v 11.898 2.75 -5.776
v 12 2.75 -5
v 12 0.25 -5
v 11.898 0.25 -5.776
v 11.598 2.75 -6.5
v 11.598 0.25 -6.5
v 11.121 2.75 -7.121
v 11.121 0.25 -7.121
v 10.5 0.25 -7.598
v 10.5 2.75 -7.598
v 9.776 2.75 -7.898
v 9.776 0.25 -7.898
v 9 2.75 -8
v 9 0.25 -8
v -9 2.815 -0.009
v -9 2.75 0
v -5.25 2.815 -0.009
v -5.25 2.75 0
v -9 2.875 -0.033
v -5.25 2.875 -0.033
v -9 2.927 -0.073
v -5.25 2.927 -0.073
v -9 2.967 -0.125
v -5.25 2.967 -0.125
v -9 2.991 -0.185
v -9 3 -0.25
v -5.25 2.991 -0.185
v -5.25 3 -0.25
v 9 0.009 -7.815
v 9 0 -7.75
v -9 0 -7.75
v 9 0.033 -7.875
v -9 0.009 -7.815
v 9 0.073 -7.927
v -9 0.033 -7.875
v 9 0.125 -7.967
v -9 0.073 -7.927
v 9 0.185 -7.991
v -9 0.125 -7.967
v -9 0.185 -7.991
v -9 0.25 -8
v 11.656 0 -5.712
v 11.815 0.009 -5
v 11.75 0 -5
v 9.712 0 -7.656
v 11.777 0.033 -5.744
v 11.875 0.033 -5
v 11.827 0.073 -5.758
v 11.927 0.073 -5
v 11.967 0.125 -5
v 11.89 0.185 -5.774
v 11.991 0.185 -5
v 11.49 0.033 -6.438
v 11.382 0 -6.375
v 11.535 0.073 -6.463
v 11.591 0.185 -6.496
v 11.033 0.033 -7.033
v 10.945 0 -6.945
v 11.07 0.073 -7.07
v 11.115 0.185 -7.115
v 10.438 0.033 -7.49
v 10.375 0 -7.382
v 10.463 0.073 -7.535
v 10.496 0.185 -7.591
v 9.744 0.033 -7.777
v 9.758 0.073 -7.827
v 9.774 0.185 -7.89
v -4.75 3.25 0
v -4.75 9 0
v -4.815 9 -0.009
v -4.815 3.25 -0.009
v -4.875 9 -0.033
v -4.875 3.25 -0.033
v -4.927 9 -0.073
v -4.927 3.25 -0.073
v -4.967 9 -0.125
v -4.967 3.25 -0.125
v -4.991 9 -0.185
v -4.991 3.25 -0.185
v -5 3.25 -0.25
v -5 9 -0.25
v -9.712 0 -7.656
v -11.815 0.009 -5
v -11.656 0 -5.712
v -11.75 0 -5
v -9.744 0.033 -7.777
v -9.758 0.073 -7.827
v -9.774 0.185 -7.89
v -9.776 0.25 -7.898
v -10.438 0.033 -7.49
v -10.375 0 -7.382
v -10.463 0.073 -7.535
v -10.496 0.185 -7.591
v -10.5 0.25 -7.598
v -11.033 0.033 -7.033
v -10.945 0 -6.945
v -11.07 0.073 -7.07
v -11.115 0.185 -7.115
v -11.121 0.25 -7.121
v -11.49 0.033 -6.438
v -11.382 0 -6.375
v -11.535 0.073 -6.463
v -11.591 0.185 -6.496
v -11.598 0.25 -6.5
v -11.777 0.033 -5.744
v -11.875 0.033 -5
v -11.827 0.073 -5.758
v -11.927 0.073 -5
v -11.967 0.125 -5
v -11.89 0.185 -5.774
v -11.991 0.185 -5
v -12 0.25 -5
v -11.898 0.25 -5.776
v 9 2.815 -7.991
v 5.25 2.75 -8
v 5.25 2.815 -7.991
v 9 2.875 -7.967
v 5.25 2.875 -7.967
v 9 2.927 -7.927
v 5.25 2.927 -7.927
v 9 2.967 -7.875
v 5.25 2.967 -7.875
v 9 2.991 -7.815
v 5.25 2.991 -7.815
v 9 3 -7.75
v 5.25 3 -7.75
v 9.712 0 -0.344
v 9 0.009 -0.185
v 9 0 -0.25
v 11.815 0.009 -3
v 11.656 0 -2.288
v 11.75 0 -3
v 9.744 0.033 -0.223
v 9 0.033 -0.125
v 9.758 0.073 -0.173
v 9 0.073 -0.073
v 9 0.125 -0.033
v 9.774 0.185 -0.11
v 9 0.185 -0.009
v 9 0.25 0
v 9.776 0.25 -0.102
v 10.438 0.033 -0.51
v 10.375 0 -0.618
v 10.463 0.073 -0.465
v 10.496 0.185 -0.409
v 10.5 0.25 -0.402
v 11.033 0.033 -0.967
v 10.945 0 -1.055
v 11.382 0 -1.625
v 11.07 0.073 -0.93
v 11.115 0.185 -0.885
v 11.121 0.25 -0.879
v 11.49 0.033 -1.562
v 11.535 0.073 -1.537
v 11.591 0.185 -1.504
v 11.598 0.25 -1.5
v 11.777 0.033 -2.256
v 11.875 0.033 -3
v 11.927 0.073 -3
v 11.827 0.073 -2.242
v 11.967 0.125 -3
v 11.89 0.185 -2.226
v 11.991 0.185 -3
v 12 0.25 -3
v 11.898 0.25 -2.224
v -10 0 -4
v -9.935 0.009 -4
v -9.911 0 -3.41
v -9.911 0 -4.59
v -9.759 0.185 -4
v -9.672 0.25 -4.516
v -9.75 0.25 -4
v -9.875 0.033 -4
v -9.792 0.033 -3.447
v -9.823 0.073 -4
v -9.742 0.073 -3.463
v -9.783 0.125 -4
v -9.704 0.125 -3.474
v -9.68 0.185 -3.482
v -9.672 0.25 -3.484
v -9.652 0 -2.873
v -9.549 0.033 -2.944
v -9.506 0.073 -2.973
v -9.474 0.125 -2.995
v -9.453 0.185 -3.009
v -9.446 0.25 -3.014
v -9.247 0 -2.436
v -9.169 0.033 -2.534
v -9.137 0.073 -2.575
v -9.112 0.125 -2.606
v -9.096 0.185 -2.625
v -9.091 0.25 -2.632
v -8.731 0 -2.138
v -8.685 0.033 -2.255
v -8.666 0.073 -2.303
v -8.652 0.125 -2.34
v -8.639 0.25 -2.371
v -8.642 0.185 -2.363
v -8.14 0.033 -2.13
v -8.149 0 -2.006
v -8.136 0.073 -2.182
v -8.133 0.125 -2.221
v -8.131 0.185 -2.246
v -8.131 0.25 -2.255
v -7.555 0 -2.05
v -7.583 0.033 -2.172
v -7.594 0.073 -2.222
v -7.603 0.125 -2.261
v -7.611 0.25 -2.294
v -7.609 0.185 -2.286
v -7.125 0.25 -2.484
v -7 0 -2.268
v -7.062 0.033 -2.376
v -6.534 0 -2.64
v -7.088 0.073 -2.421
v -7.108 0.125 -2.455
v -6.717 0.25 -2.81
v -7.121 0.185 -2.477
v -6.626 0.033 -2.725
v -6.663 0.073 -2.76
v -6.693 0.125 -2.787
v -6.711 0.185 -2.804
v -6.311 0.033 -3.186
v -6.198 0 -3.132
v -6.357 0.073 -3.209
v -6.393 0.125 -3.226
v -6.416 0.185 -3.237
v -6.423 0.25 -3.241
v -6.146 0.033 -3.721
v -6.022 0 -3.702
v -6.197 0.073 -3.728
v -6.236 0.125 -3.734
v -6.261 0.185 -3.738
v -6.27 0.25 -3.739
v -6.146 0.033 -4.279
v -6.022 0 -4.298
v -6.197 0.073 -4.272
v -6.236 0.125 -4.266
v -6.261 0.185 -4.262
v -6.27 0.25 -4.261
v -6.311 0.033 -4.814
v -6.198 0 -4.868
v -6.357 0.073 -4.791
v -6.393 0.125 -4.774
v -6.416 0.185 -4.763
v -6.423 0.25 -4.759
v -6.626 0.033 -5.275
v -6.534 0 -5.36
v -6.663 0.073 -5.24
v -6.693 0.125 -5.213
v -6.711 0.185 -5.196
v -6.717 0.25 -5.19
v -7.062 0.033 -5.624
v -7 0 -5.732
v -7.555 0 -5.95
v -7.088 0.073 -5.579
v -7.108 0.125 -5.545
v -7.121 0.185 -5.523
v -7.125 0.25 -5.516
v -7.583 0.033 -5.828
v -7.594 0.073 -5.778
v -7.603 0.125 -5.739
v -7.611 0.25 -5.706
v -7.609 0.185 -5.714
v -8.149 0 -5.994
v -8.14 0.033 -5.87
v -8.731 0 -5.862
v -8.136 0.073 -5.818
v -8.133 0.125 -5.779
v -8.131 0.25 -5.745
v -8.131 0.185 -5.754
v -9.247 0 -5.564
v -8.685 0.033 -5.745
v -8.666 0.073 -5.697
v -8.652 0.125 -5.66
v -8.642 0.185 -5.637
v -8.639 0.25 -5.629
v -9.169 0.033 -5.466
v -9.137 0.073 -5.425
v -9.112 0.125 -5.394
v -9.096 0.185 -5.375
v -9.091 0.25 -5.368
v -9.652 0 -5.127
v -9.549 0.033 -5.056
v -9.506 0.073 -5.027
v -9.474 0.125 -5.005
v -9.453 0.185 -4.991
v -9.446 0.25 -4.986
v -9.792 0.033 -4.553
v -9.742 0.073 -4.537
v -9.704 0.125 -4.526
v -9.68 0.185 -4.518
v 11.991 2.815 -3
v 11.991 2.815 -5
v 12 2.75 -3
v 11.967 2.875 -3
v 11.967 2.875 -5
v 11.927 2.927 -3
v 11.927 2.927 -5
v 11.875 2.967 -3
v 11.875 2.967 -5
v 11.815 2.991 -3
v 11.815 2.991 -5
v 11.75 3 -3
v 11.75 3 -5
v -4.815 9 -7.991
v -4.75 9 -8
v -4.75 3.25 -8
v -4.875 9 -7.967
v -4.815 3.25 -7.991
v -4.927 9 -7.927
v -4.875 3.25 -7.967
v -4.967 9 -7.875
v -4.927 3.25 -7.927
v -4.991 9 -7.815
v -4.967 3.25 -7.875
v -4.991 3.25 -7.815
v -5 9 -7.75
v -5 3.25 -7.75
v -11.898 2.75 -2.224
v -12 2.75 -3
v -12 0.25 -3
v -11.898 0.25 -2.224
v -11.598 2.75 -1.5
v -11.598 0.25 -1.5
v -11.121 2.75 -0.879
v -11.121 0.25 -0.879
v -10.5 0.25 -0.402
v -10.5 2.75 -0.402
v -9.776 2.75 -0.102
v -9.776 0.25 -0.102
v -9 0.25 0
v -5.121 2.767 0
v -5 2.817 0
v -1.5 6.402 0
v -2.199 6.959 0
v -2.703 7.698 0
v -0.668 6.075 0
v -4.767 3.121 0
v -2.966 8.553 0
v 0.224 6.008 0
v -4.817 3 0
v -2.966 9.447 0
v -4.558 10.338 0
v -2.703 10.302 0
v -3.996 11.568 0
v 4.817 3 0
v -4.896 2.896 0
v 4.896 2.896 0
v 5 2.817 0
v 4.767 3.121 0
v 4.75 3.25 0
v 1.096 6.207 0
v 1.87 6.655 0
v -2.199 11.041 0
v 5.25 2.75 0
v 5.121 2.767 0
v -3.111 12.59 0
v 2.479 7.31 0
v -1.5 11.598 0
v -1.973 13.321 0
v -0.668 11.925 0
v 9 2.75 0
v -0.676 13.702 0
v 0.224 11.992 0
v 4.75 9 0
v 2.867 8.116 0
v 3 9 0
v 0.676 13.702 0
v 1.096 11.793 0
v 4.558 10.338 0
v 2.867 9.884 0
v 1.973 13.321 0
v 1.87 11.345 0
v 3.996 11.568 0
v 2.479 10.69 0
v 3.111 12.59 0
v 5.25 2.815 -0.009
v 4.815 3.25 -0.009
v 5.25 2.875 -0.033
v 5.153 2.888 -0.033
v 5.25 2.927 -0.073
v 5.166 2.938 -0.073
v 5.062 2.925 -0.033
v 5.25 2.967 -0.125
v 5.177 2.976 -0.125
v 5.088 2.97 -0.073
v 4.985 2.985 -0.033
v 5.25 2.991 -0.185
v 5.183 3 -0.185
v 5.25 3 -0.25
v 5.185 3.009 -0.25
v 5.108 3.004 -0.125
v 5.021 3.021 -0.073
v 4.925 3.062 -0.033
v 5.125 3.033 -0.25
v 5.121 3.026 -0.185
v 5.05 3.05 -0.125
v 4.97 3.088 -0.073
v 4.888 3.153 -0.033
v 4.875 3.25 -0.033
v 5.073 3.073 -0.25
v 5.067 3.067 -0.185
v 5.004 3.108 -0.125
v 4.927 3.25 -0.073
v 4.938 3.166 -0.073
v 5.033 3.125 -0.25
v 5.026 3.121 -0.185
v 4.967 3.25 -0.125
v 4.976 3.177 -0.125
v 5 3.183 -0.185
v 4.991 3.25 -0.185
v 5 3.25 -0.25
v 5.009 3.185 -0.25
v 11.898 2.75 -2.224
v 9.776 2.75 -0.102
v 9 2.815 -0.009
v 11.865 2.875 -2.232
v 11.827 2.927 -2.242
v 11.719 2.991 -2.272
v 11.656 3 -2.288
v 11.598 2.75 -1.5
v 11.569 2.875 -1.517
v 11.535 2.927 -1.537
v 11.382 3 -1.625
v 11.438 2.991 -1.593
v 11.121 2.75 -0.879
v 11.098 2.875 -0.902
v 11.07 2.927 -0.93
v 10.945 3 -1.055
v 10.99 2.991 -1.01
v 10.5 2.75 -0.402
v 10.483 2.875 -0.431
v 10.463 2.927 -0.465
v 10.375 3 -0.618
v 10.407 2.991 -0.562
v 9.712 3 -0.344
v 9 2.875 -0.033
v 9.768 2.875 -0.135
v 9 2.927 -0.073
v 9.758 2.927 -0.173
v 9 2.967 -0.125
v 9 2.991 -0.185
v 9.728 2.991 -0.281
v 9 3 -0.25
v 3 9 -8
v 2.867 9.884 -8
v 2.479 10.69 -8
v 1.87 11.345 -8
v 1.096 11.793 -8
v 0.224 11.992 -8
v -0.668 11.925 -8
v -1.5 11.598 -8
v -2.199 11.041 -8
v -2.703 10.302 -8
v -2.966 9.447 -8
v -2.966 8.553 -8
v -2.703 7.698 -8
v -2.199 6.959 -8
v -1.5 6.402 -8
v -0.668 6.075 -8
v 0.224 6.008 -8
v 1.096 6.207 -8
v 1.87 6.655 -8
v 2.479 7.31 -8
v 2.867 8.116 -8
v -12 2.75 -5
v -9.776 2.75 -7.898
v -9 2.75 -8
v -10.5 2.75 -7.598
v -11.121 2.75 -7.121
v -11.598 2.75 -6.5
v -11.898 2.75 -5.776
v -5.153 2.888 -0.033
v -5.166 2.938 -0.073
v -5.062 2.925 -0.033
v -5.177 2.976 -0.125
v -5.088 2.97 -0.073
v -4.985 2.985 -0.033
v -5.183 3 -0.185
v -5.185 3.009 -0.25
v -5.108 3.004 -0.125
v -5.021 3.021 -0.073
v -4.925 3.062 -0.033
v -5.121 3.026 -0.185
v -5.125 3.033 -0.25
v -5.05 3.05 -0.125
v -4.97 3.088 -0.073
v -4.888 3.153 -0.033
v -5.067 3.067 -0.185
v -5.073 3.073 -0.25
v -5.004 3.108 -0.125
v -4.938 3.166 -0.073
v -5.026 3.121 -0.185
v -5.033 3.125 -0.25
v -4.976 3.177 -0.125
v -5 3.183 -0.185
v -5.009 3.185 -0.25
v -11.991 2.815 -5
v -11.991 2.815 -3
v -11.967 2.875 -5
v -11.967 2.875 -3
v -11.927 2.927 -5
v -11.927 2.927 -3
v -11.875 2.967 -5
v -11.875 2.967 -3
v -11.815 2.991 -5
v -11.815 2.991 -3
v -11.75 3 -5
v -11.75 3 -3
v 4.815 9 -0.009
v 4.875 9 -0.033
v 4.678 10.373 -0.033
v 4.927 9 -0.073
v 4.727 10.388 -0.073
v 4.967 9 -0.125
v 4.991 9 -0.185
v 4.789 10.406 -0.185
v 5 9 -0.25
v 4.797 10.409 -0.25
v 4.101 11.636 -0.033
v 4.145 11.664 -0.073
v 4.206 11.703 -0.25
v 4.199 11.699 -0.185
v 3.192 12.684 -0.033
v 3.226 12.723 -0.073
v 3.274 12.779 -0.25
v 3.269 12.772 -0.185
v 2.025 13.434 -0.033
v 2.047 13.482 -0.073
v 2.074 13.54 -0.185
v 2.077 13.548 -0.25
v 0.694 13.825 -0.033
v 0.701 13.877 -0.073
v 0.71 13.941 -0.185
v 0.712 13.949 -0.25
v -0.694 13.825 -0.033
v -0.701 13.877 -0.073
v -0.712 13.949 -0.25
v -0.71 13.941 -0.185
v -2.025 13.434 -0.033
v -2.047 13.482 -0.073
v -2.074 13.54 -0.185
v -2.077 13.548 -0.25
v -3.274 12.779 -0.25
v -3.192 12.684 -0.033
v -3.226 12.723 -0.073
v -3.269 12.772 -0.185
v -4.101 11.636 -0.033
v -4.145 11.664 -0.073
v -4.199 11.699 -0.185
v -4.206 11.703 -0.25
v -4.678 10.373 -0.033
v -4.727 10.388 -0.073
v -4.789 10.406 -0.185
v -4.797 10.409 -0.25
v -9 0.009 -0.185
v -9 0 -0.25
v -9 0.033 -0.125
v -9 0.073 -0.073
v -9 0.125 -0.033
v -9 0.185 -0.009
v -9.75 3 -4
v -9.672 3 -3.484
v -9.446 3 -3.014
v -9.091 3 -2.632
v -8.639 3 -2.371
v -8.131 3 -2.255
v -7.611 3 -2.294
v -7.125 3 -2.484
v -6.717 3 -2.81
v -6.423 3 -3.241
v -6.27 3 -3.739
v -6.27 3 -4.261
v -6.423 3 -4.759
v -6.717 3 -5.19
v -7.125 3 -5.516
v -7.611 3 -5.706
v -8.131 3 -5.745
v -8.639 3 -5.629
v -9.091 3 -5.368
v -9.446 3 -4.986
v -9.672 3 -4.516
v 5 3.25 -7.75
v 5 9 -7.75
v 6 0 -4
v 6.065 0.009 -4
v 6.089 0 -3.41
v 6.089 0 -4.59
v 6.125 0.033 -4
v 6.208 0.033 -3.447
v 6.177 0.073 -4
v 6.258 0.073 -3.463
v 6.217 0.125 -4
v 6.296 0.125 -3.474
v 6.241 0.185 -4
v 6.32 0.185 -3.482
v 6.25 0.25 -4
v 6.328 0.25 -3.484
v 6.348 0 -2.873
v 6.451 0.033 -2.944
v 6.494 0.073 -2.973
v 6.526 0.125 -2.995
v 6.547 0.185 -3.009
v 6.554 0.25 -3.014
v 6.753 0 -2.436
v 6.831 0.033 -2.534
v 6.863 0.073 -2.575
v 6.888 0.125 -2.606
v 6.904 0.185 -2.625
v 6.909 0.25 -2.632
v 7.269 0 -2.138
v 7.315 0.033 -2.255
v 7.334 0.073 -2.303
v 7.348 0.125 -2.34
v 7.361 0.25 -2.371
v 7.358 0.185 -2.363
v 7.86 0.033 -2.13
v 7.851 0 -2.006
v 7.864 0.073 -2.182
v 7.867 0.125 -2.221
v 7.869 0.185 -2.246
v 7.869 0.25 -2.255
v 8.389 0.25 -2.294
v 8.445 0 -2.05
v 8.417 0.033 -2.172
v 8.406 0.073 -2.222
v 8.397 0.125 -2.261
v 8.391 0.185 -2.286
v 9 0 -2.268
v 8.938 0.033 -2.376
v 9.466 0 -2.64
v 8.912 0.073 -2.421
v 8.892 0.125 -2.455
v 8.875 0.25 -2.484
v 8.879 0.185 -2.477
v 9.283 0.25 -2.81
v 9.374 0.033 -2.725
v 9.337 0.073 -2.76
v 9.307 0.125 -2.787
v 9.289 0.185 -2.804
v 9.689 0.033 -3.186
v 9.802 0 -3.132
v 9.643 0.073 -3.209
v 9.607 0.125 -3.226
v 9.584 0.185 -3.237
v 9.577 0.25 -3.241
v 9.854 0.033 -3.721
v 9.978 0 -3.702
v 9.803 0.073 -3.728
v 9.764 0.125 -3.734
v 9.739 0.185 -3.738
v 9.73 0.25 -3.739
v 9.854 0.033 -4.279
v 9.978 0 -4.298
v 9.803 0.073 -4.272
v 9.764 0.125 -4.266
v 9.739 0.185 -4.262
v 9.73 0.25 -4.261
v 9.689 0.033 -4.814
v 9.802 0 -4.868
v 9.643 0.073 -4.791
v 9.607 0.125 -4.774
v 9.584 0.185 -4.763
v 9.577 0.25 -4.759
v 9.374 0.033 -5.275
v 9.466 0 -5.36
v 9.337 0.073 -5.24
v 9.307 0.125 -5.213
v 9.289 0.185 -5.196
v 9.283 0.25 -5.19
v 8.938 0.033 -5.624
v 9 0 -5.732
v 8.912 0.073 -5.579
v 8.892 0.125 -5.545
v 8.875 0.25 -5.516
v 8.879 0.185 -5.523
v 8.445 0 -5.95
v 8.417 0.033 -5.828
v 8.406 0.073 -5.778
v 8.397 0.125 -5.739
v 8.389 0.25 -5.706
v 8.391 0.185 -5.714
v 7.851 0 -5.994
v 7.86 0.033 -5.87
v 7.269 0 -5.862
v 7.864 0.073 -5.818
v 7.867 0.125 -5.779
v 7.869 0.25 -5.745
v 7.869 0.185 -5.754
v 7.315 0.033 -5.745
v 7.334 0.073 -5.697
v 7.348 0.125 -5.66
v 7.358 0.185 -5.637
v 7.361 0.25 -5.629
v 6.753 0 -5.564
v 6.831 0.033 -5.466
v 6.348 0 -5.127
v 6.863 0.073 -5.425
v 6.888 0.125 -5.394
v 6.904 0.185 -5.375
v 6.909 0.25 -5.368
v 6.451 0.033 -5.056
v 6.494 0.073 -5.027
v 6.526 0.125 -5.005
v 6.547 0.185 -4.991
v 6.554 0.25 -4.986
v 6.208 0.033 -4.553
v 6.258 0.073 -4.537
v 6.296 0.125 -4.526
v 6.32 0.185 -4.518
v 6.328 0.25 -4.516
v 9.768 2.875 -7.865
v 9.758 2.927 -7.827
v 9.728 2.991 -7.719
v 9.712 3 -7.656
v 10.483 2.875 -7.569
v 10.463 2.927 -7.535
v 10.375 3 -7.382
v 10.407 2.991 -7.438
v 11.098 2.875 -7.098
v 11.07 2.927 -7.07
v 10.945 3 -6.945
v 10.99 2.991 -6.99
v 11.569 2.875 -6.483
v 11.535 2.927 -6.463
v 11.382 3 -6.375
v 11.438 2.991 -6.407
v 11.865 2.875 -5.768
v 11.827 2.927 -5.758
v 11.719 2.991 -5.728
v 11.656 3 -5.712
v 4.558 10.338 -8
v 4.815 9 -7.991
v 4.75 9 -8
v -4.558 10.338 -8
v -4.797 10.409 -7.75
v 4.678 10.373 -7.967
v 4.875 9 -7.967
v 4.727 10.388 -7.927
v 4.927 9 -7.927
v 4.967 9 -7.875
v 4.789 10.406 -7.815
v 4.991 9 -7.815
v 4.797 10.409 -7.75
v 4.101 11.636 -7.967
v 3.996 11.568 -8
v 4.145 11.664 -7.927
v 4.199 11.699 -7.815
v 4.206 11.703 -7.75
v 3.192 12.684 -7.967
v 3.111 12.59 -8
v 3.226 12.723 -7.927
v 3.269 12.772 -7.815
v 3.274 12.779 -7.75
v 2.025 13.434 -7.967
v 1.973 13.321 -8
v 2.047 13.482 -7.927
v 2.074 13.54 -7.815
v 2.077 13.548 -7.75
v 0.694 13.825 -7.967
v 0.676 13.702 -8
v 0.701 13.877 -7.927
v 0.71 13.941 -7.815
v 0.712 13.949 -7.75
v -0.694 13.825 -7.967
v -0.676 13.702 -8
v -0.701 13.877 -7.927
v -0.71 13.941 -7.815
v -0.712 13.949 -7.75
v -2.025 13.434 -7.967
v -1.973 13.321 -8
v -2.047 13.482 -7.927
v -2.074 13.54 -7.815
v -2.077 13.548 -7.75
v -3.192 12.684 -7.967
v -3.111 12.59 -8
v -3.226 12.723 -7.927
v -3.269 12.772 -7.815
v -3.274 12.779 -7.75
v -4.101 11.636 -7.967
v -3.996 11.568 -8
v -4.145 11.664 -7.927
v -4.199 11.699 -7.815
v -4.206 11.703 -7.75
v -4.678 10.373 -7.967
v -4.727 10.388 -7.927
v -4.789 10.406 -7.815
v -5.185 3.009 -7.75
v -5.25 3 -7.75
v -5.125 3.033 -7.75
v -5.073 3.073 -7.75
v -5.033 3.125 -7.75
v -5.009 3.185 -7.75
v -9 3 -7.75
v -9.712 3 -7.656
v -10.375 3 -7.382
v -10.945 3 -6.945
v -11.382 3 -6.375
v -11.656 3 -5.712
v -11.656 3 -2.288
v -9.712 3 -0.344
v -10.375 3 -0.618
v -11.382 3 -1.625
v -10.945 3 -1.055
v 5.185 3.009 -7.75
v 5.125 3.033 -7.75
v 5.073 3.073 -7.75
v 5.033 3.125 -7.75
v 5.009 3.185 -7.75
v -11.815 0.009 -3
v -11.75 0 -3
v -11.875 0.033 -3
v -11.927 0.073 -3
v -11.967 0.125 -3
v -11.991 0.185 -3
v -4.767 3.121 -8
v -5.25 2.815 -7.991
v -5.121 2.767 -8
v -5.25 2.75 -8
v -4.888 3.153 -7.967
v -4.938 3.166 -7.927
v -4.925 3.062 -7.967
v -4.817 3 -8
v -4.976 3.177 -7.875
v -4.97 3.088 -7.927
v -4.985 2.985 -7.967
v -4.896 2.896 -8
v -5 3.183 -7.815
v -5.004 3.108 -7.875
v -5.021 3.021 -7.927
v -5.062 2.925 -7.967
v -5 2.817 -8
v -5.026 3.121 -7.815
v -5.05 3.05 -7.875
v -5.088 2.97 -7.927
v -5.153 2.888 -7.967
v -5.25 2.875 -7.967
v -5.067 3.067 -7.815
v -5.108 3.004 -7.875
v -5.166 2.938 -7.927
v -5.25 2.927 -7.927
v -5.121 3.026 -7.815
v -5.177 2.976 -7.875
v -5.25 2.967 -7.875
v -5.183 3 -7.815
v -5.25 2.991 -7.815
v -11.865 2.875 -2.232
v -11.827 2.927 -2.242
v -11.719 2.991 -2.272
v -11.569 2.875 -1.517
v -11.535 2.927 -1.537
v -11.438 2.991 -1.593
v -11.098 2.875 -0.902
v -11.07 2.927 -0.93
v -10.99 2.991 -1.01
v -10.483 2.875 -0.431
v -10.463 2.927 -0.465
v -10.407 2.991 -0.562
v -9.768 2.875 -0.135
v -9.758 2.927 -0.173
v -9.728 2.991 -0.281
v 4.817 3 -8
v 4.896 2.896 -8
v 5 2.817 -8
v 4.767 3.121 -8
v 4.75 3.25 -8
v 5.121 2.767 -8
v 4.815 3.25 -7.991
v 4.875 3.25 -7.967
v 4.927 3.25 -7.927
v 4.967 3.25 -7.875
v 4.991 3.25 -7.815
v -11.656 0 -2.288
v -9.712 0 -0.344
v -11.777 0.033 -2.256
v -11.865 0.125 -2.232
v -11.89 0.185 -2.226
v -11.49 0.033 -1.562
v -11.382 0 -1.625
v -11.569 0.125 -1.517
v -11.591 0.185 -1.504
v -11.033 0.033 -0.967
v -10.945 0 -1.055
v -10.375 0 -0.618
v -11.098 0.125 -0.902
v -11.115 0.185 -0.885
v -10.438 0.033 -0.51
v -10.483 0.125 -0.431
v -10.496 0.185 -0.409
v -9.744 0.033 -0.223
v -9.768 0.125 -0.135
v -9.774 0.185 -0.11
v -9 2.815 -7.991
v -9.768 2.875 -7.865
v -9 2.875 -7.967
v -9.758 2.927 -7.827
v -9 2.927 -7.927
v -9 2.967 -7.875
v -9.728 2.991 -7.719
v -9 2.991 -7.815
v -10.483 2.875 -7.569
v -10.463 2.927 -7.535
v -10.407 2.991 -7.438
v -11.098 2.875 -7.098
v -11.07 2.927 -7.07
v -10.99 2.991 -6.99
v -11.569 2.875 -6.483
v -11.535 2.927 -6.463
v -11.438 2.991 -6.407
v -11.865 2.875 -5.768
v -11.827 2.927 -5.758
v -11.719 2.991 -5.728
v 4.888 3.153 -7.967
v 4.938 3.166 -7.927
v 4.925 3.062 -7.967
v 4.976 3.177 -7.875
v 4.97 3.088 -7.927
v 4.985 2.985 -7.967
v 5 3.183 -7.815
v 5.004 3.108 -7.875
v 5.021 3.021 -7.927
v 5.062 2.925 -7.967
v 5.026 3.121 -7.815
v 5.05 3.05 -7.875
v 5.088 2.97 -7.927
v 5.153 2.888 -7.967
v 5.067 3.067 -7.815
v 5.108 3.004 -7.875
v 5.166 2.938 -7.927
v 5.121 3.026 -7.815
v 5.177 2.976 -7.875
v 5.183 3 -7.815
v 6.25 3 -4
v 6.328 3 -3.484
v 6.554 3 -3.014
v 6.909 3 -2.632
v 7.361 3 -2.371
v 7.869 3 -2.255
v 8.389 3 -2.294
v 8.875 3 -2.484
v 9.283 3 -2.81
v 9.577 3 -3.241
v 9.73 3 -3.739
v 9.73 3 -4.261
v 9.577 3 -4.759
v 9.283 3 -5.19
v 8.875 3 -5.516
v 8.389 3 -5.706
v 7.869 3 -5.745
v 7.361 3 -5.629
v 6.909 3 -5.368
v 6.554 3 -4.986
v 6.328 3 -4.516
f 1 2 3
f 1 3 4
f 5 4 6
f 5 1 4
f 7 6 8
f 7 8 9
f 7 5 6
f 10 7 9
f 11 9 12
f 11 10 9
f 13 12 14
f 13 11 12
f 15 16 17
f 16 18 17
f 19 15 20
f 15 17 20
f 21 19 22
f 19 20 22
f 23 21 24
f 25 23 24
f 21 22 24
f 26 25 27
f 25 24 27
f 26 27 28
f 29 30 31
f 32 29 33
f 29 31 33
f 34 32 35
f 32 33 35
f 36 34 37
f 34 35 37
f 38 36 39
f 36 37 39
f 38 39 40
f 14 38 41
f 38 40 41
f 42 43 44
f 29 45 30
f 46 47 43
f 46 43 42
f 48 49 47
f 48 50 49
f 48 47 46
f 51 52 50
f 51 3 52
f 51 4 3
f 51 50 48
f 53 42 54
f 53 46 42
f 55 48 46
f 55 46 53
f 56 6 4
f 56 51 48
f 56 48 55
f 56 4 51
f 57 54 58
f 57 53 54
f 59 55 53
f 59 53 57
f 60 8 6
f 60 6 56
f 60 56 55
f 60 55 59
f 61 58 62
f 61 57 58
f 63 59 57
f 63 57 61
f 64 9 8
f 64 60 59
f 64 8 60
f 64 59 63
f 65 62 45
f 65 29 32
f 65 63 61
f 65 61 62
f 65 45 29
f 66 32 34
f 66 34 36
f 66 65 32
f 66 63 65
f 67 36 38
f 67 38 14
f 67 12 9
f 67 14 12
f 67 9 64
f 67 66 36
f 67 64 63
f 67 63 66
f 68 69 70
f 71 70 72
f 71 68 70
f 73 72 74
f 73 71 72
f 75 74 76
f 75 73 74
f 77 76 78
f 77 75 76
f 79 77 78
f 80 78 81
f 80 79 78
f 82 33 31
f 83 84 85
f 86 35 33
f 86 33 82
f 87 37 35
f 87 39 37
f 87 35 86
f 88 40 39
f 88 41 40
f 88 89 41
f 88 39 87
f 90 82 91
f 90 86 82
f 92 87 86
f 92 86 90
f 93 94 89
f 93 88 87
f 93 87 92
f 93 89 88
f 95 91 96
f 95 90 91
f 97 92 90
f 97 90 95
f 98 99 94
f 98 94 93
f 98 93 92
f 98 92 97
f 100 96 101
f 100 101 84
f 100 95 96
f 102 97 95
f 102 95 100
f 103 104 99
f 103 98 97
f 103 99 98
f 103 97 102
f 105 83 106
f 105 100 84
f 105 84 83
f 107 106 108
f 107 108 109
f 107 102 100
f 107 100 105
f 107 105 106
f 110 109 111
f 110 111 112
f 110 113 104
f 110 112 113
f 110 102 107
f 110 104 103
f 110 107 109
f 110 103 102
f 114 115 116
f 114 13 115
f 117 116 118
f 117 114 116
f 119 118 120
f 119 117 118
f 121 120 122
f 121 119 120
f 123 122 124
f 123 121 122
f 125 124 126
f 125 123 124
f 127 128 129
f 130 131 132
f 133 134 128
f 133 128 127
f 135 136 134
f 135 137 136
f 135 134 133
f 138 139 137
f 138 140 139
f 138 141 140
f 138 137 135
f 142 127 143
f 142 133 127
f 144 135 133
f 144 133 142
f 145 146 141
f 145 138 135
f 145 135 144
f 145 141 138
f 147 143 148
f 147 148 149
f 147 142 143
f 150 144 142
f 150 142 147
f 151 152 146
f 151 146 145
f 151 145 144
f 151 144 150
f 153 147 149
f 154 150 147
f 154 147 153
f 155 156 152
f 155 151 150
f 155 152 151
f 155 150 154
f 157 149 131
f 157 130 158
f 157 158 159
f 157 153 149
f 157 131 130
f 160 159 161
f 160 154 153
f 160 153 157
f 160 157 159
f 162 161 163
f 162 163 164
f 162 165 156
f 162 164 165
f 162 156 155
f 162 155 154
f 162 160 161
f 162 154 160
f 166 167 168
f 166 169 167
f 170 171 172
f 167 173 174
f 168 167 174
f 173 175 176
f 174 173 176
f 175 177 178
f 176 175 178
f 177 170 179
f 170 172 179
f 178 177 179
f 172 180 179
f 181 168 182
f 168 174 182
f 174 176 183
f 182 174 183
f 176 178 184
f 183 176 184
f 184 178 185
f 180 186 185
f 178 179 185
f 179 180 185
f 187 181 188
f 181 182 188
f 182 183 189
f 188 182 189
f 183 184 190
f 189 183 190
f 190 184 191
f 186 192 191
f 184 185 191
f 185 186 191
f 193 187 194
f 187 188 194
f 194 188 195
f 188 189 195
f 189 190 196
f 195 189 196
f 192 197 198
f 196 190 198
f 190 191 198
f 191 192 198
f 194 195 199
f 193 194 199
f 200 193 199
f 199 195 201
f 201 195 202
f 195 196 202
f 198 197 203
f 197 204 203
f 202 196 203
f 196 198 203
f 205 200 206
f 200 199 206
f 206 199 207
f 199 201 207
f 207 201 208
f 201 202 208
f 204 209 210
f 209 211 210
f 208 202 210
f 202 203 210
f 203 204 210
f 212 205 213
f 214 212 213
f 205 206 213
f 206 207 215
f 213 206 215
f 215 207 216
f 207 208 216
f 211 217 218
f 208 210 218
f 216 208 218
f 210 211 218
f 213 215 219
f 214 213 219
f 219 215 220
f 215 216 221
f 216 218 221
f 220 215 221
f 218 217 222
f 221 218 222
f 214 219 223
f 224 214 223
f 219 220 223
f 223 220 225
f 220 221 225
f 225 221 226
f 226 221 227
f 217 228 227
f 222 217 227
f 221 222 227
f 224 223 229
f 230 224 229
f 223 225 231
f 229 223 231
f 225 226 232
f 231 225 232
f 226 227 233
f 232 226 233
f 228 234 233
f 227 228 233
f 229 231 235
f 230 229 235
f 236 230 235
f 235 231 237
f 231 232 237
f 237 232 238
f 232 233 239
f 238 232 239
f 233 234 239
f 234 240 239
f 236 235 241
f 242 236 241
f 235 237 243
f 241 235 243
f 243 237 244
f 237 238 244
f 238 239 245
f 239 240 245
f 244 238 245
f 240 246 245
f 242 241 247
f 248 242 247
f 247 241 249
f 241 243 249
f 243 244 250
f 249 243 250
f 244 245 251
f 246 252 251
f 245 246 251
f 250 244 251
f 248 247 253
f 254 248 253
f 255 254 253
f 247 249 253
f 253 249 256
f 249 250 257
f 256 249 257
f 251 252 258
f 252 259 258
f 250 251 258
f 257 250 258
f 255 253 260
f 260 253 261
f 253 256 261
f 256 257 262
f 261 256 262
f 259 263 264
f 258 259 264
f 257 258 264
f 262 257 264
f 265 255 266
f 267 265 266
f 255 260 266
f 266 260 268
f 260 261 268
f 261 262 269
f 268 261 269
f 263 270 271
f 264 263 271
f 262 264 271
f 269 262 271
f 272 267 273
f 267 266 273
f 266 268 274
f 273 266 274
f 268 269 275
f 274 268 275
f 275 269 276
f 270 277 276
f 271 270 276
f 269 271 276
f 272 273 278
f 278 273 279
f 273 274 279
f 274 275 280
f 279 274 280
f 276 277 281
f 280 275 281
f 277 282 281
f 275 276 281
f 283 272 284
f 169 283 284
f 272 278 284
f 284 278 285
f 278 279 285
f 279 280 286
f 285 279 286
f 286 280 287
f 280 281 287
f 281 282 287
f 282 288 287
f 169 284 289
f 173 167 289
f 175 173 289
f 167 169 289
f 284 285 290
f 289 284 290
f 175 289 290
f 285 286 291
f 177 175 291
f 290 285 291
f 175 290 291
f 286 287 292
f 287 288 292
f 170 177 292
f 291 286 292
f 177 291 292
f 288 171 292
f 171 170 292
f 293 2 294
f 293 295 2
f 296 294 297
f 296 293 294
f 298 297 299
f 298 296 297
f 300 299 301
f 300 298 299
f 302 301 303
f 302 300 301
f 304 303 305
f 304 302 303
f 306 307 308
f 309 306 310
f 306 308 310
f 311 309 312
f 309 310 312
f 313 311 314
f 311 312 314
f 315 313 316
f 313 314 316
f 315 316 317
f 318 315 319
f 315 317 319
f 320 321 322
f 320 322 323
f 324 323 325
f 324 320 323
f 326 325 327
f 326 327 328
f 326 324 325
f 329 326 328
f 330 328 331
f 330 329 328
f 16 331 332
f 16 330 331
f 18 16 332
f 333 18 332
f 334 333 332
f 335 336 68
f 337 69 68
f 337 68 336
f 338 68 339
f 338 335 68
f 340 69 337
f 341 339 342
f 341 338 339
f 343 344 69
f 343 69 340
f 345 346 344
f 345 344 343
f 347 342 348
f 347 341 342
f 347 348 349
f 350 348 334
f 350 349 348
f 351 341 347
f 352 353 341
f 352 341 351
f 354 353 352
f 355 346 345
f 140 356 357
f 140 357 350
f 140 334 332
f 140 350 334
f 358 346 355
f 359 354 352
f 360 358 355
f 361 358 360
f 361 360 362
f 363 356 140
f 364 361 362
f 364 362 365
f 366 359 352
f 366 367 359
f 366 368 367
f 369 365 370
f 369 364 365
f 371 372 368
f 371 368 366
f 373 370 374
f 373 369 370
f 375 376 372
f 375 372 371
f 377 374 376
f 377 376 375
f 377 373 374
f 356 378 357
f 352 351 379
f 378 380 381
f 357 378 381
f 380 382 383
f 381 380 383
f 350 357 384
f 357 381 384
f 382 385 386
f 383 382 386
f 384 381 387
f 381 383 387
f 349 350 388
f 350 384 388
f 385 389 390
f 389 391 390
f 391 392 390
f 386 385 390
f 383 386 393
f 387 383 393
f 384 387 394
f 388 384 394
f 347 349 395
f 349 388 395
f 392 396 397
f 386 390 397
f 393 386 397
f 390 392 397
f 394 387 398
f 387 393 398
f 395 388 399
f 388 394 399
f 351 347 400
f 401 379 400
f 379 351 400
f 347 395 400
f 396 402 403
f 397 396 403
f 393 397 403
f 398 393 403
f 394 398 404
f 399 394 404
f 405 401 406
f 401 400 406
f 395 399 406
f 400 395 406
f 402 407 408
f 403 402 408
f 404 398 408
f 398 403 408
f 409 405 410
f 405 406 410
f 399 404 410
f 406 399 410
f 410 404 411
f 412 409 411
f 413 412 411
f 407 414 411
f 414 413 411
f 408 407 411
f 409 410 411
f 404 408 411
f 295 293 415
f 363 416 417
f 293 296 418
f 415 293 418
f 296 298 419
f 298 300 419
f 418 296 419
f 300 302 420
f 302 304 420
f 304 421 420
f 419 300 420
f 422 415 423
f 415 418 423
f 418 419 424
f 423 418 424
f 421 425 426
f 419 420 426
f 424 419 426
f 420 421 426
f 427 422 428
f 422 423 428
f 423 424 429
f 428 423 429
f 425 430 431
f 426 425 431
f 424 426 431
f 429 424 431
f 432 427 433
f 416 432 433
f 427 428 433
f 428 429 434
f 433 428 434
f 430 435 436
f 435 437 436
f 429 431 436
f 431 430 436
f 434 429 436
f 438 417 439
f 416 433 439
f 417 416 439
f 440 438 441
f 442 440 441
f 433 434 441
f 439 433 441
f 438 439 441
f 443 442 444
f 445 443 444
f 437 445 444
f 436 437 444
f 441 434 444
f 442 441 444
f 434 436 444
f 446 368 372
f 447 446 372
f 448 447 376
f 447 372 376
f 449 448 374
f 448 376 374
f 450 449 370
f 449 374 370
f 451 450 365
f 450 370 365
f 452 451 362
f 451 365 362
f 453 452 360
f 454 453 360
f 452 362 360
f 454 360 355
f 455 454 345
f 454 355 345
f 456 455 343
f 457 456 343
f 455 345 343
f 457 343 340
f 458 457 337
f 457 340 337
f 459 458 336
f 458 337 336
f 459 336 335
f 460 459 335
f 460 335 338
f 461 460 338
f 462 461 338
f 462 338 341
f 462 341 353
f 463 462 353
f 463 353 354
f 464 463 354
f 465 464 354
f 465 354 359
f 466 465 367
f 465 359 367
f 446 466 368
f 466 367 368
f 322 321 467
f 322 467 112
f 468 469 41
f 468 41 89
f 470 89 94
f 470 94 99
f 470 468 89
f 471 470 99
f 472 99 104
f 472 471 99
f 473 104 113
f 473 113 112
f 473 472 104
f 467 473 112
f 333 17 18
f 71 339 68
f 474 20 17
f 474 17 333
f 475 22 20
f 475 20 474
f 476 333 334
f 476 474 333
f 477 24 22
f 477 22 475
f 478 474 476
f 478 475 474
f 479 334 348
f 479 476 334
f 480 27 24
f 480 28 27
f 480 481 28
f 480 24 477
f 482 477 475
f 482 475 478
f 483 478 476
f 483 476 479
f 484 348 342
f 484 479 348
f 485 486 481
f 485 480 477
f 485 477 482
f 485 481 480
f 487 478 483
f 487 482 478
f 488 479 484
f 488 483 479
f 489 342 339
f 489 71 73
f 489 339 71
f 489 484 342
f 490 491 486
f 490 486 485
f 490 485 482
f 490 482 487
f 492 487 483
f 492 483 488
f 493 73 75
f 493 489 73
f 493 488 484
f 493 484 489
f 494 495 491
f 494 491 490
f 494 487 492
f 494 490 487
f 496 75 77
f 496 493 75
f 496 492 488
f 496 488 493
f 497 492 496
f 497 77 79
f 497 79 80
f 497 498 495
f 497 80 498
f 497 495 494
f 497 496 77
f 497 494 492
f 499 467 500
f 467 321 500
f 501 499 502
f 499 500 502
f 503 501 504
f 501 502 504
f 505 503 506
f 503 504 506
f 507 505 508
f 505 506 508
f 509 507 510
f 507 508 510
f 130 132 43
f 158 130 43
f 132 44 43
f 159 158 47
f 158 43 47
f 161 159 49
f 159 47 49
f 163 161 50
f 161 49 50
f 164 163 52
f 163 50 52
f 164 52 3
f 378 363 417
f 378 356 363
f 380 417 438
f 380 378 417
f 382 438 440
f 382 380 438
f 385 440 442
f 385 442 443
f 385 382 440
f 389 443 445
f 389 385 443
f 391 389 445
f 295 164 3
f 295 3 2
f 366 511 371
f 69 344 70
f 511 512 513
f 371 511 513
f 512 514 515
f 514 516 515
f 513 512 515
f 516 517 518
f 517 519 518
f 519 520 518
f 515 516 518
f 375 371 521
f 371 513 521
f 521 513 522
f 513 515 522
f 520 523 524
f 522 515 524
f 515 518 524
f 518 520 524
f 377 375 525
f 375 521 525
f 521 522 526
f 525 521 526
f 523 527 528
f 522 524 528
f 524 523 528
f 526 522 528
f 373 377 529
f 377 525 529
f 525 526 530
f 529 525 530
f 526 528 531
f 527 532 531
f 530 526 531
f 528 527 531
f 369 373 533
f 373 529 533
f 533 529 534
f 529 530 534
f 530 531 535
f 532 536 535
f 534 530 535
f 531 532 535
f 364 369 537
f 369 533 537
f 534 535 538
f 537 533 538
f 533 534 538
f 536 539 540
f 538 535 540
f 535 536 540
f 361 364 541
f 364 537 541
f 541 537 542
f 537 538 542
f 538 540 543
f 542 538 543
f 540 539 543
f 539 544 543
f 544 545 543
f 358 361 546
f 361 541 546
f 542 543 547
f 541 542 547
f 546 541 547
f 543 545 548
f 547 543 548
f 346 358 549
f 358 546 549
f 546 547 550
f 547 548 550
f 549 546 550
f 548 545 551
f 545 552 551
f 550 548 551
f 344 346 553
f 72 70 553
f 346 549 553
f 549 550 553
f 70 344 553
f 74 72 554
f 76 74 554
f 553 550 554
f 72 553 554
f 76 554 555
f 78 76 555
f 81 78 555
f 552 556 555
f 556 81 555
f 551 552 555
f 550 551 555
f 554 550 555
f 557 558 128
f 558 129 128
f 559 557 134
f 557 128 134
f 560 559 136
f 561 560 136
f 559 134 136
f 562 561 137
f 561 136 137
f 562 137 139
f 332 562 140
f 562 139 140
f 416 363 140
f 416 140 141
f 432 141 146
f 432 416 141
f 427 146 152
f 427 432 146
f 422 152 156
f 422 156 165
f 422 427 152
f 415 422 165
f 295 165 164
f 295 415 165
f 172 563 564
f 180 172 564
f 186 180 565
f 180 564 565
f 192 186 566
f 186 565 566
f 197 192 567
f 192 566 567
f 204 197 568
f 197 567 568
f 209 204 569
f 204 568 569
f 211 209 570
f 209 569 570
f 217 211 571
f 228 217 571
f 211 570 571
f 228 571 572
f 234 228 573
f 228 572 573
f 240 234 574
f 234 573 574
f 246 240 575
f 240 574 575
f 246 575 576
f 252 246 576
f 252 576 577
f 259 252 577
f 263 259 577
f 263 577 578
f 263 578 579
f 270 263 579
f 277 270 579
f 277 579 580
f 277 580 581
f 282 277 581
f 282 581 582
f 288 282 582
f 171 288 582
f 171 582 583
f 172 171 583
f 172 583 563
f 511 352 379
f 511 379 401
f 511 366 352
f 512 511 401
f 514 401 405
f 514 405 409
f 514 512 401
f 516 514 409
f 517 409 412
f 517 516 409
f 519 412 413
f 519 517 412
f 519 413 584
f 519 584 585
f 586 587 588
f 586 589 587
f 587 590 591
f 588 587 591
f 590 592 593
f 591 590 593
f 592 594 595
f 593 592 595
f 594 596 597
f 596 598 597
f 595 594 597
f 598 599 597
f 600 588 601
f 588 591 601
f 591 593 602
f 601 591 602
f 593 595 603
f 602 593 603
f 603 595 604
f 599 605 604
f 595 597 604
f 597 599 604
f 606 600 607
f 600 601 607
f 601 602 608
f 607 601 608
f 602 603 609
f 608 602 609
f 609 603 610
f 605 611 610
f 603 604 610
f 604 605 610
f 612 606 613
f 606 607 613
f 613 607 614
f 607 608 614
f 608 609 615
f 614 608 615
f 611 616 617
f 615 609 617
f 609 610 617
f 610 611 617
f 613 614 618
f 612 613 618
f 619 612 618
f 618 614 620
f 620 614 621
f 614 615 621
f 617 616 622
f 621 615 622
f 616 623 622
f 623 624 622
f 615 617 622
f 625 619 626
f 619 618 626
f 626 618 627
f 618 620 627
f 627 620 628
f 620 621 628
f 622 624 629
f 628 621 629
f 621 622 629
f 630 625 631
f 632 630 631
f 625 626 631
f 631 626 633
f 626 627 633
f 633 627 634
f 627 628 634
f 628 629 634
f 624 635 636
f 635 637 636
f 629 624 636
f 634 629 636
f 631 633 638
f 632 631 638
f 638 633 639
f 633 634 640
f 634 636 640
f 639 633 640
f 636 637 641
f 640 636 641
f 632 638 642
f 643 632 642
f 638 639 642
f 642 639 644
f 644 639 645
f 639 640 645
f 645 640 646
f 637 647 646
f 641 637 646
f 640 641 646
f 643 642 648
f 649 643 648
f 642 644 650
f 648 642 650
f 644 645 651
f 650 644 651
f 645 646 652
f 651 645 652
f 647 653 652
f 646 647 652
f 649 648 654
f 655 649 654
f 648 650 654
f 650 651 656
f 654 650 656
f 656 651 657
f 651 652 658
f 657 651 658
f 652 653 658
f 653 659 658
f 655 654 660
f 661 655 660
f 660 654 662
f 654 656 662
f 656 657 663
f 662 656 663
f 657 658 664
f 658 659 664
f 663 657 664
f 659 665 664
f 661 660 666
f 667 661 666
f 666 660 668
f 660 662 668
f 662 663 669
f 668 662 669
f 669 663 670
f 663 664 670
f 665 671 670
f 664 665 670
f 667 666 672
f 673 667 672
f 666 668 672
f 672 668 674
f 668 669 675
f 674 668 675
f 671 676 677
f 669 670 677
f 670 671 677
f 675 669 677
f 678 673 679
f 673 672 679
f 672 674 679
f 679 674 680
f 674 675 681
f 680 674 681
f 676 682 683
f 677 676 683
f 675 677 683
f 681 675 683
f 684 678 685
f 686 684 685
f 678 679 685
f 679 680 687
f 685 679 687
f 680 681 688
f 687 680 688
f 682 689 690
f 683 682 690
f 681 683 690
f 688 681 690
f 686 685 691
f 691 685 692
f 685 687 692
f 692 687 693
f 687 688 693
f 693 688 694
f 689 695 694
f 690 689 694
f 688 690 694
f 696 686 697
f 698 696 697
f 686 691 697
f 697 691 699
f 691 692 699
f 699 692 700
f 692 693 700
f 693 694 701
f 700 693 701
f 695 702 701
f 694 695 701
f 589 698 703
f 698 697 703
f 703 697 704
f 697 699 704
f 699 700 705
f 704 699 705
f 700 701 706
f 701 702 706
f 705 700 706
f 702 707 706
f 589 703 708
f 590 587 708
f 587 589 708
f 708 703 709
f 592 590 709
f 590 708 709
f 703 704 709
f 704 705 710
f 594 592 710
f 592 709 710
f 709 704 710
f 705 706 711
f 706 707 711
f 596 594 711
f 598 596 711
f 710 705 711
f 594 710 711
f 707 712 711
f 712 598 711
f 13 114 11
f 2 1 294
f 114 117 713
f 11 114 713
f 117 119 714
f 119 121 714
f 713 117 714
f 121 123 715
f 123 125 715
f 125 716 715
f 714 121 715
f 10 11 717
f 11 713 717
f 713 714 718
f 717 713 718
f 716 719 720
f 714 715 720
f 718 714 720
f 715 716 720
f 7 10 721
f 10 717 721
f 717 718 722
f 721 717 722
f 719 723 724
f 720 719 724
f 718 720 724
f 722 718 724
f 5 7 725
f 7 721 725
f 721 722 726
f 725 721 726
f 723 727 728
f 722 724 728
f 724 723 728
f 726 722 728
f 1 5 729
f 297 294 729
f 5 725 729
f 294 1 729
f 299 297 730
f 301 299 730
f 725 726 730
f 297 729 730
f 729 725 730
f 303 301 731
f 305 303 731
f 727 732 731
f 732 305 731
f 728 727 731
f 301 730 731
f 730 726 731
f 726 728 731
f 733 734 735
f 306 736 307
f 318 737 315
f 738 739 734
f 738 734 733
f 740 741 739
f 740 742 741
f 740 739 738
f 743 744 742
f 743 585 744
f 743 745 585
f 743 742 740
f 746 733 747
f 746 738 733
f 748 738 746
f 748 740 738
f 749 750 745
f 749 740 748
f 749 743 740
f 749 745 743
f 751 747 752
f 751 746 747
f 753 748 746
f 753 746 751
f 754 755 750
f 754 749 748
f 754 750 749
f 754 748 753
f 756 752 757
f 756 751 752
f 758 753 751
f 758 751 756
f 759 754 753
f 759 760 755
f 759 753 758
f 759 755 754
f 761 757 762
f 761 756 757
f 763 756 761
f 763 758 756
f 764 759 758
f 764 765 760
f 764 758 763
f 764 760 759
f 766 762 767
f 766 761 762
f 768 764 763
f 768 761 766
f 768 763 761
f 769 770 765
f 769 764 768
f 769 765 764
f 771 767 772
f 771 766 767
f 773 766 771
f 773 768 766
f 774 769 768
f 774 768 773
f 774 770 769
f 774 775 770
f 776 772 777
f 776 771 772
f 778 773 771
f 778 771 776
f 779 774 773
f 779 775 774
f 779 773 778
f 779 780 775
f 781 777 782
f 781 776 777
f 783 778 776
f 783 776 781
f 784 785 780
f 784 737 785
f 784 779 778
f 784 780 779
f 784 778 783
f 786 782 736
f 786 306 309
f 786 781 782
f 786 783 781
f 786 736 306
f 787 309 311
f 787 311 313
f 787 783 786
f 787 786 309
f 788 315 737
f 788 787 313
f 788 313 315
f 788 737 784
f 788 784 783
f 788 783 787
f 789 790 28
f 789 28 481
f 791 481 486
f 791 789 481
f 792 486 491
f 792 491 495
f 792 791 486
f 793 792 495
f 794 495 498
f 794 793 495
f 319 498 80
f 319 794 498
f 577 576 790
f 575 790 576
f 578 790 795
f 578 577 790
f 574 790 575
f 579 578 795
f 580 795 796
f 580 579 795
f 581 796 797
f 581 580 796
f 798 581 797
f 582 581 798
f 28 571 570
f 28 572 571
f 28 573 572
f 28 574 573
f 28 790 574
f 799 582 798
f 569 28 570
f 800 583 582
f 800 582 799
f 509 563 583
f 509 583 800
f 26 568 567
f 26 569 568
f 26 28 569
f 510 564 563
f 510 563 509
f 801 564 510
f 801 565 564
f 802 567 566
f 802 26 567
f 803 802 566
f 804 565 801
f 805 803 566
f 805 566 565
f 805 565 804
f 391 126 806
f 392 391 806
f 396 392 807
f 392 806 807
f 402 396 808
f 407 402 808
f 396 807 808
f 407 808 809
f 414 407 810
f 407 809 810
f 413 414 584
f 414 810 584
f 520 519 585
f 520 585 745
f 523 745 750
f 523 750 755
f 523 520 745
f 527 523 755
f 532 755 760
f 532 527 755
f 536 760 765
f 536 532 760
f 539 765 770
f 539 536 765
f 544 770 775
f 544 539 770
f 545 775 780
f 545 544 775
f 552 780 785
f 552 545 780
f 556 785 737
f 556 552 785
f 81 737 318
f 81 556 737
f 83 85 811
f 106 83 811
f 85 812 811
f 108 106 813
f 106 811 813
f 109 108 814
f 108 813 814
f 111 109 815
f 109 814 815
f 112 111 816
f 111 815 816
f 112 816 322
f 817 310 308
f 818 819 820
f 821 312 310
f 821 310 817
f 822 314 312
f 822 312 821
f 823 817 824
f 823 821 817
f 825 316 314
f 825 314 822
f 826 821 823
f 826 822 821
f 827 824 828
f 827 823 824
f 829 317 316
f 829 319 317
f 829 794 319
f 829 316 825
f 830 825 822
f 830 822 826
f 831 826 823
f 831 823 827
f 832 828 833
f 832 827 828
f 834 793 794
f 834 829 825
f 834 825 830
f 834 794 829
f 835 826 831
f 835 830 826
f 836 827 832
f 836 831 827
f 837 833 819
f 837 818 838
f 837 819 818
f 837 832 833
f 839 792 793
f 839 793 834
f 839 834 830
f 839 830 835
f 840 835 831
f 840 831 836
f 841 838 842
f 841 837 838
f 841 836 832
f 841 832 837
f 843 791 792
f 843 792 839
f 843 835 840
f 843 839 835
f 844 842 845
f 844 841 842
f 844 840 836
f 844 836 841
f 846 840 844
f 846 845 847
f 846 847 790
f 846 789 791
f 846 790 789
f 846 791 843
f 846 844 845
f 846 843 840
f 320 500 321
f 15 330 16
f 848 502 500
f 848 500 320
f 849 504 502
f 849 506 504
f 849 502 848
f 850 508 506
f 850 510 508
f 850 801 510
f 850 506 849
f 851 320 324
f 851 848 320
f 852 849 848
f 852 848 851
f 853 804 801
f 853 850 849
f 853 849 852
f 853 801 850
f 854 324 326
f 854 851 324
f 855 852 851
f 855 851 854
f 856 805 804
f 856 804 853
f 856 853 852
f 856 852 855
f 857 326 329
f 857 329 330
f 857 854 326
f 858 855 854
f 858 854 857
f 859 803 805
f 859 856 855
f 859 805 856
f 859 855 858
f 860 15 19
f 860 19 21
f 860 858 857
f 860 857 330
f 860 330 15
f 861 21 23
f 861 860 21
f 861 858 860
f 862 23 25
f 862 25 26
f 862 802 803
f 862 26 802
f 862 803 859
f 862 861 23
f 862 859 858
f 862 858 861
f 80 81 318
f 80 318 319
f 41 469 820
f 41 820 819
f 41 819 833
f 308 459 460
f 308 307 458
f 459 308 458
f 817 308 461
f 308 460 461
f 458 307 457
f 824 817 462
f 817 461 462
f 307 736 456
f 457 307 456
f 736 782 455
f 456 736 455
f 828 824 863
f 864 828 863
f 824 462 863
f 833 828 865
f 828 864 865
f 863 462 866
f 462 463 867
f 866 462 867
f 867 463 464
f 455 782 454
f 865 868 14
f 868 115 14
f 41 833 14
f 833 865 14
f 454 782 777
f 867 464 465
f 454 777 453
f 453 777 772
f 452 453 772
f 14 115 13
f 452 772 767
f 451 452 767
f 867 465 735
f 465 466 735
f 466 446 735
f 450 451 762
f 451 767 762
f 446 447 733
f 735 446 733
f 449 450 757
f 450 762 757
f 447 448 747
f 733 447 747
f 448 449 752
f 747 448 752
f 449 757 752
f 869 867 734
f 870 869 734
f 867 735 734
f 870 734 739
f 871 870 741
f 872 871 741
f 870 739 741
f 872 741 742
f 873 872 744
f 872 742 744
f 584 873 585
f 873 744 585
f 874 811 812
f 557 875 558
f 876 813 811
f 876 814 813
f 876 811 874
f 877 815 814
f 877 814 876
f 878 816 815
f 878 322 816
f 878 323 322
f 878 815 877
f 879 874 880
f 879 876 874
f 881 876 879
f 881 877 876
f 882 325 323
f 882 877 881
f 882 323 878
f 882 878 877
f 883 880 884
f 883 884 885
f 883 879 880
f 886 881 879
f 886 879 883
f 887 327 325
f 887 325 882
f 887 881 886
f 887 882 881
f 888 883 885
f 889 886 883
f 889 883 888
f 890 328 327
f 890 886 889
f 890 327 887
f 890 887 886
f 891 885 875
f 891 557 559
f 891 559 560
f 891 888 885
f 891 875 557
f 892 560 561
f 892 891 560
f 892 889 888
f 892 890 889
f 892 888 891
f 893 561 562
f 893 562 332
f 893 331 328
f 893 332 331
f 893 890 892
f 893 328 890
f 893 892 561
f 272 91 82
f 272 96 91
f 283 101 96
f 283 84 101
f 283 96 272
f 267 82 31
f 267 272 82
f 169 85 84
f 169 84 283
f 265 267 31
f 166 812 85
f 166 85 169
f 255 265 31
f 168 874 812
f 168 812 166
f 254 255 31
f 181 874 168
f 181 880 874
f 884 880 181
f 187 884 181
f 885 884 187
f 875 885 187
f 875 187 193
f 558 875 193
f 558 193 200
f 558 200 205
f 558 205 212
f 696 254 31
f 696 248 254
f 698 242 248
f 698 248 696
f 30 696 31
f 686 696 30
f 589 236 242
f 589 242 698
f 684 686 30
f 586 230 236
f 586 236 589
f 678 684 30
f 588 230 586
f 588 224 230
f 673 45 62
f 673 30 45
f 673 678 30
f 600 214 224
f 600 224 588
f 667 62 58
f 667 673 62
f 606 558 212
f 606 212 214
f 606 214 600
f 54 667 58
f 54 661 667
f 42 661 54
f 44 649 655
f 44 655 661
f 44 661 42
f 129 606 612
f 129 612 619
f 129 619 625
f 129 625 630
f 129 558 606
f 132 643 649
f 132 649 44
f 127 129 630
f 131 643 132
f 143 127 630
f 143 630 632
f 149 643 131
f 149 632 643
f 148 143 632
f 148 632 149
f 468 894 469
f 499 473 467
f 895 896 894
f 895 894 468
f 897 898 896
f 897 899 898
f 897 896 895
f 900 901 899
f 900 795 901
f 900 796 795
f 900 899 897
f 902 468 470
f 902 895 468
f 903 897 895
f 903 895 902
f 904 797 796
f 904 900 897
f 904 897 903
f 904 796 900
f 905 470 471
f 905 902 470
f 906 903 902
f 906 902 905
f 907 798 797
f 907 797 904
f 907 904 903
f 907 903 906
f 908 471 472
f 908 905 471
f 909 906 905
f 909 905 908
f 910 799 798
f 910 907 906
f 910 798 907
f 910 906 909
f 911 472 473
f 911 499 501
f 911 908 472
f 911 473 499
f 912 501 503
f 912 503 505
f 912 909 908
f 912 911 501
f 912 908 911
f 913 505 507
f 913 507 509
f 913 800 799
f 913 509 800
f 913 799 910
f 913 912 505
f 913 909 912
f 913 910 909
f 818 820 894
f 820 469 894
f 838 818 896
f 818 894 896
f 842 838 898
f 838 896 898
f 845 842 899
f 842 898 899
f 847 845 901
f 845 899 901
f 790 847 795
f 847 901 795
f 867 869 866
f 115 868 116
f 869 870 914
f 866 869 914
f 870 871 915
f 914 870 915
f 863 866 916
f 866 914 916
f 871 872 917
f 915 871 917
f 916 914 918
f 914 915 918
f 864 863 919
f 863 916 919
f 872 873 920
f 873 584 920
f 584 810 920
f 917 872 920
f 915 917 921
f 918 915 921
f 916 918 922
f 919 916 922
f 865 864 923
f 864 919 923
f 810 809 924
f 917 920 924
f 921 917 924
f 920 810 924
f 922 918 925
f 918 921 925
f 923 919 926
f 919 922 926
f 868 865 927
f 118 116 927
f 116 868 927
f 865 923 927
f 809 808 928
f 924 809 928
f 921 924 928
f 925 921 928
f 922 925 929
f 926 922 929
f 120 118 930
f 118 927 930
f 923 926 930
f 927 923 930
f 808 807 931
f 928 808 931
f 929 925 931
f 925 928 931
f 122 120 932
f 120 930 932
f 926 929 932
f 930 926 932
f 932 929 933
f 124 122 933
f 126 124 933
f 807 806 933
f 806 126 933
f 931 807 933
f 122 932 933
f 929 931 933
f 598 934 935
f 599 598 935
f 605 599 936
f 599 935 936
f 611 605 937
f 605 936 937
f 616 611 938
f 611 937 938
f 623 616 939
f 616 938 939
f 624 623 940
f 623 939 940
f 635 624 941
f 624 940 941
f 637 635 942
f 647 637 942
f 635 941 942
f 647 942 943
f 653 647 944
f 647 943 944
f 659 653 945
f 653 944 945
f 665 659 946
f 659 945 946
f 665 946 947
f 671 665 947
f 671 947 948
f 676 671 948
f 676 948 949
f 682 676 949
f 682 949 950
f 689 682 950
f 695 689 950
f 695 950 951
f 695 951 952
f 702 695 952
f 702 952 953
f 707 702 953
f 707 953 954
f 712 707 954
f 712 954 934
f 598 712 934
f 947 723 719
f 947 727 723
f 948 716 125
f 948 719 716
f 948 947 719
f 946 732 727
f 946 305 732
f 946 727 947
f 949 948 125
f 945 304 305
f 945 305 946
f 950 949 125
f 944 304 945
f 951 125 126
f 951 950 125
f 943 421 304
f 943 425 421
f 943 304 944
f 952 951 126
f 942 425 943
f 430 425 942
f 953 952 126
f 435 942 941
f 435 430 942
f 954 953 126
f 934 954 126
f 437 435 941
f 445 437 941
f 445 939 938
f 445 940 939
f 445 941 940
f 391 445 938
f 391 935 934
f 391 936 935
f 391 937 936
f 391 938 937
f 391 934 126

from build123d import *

# Parameters (mm, degrees)
SKETCH1_R           = 3
BOSS_EXTRUDE1_DEPTH = 8
SKETCH2_OUTSIDE_W   = 31.782
SKETCH2_OUTSIDE_H   = 15.782
SKETCH2_OUTSIDE_R   = 1.75
CUT_EXTRUDE1_DEPTH  = 8
FILLET1_R           = 0.25


with BuildPart() as part:
    # Sketch1 → Boss-Extrude1 (new body)
    with BuildSketch(Plane.XY):
        with BuildLine():
            Line((-12, 0), (12, 0))
            Line((12, 0), (12, 3))
            Line((12, 3), (5, 3))
            Line((5, 3), (5, 9))
            ThreePointArc((5, 9), (0, 14), (-5, 9))
            Line((-5, 9), (-5, 3))
            Line((-5, 3), (-12, 3))
            Line((-12, 3), (-12, 0))
        make_face()
        with Locations((0, 9)):
            Circle(SKETCH1_R, mode=Mode.SUBTRACT)
    extrude(amount=-BOSS_EXTRUDE1_DEPTH)

    # Sketch2 outside → Cut-Extrude1 (cut)
    # profile 1 of 3: a face of its own
    with BuildSketch(Plane(origin=(0, 3, 0), x_dir=(1, 0, 0), z_dir=(0, 1, 0))):
        with Locations((0, 4)):
            Rectangle(SKETCH2_OUTSIDE_W, SKETCH2_OUTSIDE_H)
        with BuildLine():
            Line((-8, 8), (-9, 8))
            ThreePointArc((-9, 8), (-11.121320344, 7.121320344), (-12, 5))
            Line((-12, 5), (-12, 3))
            ThreePointArc((-12, 3), (-11.121320344, 0.878679656), (-9, 0))
            Line((-9, 0), (-8, 0))
            Line((-8, 0), (8, 0))
            Line((8, 0), (9, 0))
            ThreePointArc((9, 0), (11.121320344, 0.878679656), (12, 3))
            Line((12, 3), (12, 5))
            ThreePointArc((12, 5), (11.121320344, 7.121320344), (9, 8))
            Line((9, 8), (8, 8))
            Line((8, 8), (-8, 8))
        make_face(mode=Mode.SUBTRACT)
    # profile 2 of 3: a face of its own
    with BuildSketch(Plane(origin=(0, 3, 0), x_dir=(1, 0, 0), z_dir=(0, 1, 0))):
        with Locations(Location((8, 4, 0), (0, 0, 180))):
            Circle(SKETCH2_OUTSIDE_R)
    # profile 3 of 3: a face of its own
    with BuildSketch(Plane(origin=(0, 3, 0), x_dir=(1, 0, 0), z_dir=(0, 1, 0))):
        with Locations(Location((-8, 4, 0), (0, 0, 180))):
            Circle(SKETCH2_OUTSIDE_R)
    extrude(amount=-CUT_EXTRUDE1_DEPTH, mode=Mode.SUBTRACT)

    # Fillet1
    fillet1_edges = [part.edges().sort_by_distance(p)[0] for p in [
        (-5, 3, -4),
        (5, 3, -4),
        (5, 6, -8),
        (0, 14, -8),
        (-5, 6, -8),
        (0, 0, 0),
        (7, 3, 0),
        (-7, 3, -8),
        (7, 3, -8),
        (0, 0, -8),
        (-12, 0, -4),
        (12, 0, -4),
        (12, 3, -4),
        (-12, 3, -4),
        (-6.25, 0, -4),
        (11.121320344, 0, -7.121320344),
        (11.121320344, 3, -7.121320344),
        (11.121320344, 0, -0.878679656),
        (11.121320344, 3, -0.878679656),
        (-11.121320344, 0, -0.878679656),
        (-11.121320344, 3, -0.878679656),
        (-11.121320344, 0, -7.121320344),
        (-11.121320344, 3, -7.121320344),
        (9.75, 0, -4),
        (-7, 3, 0),
        (-5, 6, 0),
        (0, 14, 0),
        (5, 6, 0),
    ]]
    fillet(fillet1_edges, radius=FILLET1_R)


solid = part.part
